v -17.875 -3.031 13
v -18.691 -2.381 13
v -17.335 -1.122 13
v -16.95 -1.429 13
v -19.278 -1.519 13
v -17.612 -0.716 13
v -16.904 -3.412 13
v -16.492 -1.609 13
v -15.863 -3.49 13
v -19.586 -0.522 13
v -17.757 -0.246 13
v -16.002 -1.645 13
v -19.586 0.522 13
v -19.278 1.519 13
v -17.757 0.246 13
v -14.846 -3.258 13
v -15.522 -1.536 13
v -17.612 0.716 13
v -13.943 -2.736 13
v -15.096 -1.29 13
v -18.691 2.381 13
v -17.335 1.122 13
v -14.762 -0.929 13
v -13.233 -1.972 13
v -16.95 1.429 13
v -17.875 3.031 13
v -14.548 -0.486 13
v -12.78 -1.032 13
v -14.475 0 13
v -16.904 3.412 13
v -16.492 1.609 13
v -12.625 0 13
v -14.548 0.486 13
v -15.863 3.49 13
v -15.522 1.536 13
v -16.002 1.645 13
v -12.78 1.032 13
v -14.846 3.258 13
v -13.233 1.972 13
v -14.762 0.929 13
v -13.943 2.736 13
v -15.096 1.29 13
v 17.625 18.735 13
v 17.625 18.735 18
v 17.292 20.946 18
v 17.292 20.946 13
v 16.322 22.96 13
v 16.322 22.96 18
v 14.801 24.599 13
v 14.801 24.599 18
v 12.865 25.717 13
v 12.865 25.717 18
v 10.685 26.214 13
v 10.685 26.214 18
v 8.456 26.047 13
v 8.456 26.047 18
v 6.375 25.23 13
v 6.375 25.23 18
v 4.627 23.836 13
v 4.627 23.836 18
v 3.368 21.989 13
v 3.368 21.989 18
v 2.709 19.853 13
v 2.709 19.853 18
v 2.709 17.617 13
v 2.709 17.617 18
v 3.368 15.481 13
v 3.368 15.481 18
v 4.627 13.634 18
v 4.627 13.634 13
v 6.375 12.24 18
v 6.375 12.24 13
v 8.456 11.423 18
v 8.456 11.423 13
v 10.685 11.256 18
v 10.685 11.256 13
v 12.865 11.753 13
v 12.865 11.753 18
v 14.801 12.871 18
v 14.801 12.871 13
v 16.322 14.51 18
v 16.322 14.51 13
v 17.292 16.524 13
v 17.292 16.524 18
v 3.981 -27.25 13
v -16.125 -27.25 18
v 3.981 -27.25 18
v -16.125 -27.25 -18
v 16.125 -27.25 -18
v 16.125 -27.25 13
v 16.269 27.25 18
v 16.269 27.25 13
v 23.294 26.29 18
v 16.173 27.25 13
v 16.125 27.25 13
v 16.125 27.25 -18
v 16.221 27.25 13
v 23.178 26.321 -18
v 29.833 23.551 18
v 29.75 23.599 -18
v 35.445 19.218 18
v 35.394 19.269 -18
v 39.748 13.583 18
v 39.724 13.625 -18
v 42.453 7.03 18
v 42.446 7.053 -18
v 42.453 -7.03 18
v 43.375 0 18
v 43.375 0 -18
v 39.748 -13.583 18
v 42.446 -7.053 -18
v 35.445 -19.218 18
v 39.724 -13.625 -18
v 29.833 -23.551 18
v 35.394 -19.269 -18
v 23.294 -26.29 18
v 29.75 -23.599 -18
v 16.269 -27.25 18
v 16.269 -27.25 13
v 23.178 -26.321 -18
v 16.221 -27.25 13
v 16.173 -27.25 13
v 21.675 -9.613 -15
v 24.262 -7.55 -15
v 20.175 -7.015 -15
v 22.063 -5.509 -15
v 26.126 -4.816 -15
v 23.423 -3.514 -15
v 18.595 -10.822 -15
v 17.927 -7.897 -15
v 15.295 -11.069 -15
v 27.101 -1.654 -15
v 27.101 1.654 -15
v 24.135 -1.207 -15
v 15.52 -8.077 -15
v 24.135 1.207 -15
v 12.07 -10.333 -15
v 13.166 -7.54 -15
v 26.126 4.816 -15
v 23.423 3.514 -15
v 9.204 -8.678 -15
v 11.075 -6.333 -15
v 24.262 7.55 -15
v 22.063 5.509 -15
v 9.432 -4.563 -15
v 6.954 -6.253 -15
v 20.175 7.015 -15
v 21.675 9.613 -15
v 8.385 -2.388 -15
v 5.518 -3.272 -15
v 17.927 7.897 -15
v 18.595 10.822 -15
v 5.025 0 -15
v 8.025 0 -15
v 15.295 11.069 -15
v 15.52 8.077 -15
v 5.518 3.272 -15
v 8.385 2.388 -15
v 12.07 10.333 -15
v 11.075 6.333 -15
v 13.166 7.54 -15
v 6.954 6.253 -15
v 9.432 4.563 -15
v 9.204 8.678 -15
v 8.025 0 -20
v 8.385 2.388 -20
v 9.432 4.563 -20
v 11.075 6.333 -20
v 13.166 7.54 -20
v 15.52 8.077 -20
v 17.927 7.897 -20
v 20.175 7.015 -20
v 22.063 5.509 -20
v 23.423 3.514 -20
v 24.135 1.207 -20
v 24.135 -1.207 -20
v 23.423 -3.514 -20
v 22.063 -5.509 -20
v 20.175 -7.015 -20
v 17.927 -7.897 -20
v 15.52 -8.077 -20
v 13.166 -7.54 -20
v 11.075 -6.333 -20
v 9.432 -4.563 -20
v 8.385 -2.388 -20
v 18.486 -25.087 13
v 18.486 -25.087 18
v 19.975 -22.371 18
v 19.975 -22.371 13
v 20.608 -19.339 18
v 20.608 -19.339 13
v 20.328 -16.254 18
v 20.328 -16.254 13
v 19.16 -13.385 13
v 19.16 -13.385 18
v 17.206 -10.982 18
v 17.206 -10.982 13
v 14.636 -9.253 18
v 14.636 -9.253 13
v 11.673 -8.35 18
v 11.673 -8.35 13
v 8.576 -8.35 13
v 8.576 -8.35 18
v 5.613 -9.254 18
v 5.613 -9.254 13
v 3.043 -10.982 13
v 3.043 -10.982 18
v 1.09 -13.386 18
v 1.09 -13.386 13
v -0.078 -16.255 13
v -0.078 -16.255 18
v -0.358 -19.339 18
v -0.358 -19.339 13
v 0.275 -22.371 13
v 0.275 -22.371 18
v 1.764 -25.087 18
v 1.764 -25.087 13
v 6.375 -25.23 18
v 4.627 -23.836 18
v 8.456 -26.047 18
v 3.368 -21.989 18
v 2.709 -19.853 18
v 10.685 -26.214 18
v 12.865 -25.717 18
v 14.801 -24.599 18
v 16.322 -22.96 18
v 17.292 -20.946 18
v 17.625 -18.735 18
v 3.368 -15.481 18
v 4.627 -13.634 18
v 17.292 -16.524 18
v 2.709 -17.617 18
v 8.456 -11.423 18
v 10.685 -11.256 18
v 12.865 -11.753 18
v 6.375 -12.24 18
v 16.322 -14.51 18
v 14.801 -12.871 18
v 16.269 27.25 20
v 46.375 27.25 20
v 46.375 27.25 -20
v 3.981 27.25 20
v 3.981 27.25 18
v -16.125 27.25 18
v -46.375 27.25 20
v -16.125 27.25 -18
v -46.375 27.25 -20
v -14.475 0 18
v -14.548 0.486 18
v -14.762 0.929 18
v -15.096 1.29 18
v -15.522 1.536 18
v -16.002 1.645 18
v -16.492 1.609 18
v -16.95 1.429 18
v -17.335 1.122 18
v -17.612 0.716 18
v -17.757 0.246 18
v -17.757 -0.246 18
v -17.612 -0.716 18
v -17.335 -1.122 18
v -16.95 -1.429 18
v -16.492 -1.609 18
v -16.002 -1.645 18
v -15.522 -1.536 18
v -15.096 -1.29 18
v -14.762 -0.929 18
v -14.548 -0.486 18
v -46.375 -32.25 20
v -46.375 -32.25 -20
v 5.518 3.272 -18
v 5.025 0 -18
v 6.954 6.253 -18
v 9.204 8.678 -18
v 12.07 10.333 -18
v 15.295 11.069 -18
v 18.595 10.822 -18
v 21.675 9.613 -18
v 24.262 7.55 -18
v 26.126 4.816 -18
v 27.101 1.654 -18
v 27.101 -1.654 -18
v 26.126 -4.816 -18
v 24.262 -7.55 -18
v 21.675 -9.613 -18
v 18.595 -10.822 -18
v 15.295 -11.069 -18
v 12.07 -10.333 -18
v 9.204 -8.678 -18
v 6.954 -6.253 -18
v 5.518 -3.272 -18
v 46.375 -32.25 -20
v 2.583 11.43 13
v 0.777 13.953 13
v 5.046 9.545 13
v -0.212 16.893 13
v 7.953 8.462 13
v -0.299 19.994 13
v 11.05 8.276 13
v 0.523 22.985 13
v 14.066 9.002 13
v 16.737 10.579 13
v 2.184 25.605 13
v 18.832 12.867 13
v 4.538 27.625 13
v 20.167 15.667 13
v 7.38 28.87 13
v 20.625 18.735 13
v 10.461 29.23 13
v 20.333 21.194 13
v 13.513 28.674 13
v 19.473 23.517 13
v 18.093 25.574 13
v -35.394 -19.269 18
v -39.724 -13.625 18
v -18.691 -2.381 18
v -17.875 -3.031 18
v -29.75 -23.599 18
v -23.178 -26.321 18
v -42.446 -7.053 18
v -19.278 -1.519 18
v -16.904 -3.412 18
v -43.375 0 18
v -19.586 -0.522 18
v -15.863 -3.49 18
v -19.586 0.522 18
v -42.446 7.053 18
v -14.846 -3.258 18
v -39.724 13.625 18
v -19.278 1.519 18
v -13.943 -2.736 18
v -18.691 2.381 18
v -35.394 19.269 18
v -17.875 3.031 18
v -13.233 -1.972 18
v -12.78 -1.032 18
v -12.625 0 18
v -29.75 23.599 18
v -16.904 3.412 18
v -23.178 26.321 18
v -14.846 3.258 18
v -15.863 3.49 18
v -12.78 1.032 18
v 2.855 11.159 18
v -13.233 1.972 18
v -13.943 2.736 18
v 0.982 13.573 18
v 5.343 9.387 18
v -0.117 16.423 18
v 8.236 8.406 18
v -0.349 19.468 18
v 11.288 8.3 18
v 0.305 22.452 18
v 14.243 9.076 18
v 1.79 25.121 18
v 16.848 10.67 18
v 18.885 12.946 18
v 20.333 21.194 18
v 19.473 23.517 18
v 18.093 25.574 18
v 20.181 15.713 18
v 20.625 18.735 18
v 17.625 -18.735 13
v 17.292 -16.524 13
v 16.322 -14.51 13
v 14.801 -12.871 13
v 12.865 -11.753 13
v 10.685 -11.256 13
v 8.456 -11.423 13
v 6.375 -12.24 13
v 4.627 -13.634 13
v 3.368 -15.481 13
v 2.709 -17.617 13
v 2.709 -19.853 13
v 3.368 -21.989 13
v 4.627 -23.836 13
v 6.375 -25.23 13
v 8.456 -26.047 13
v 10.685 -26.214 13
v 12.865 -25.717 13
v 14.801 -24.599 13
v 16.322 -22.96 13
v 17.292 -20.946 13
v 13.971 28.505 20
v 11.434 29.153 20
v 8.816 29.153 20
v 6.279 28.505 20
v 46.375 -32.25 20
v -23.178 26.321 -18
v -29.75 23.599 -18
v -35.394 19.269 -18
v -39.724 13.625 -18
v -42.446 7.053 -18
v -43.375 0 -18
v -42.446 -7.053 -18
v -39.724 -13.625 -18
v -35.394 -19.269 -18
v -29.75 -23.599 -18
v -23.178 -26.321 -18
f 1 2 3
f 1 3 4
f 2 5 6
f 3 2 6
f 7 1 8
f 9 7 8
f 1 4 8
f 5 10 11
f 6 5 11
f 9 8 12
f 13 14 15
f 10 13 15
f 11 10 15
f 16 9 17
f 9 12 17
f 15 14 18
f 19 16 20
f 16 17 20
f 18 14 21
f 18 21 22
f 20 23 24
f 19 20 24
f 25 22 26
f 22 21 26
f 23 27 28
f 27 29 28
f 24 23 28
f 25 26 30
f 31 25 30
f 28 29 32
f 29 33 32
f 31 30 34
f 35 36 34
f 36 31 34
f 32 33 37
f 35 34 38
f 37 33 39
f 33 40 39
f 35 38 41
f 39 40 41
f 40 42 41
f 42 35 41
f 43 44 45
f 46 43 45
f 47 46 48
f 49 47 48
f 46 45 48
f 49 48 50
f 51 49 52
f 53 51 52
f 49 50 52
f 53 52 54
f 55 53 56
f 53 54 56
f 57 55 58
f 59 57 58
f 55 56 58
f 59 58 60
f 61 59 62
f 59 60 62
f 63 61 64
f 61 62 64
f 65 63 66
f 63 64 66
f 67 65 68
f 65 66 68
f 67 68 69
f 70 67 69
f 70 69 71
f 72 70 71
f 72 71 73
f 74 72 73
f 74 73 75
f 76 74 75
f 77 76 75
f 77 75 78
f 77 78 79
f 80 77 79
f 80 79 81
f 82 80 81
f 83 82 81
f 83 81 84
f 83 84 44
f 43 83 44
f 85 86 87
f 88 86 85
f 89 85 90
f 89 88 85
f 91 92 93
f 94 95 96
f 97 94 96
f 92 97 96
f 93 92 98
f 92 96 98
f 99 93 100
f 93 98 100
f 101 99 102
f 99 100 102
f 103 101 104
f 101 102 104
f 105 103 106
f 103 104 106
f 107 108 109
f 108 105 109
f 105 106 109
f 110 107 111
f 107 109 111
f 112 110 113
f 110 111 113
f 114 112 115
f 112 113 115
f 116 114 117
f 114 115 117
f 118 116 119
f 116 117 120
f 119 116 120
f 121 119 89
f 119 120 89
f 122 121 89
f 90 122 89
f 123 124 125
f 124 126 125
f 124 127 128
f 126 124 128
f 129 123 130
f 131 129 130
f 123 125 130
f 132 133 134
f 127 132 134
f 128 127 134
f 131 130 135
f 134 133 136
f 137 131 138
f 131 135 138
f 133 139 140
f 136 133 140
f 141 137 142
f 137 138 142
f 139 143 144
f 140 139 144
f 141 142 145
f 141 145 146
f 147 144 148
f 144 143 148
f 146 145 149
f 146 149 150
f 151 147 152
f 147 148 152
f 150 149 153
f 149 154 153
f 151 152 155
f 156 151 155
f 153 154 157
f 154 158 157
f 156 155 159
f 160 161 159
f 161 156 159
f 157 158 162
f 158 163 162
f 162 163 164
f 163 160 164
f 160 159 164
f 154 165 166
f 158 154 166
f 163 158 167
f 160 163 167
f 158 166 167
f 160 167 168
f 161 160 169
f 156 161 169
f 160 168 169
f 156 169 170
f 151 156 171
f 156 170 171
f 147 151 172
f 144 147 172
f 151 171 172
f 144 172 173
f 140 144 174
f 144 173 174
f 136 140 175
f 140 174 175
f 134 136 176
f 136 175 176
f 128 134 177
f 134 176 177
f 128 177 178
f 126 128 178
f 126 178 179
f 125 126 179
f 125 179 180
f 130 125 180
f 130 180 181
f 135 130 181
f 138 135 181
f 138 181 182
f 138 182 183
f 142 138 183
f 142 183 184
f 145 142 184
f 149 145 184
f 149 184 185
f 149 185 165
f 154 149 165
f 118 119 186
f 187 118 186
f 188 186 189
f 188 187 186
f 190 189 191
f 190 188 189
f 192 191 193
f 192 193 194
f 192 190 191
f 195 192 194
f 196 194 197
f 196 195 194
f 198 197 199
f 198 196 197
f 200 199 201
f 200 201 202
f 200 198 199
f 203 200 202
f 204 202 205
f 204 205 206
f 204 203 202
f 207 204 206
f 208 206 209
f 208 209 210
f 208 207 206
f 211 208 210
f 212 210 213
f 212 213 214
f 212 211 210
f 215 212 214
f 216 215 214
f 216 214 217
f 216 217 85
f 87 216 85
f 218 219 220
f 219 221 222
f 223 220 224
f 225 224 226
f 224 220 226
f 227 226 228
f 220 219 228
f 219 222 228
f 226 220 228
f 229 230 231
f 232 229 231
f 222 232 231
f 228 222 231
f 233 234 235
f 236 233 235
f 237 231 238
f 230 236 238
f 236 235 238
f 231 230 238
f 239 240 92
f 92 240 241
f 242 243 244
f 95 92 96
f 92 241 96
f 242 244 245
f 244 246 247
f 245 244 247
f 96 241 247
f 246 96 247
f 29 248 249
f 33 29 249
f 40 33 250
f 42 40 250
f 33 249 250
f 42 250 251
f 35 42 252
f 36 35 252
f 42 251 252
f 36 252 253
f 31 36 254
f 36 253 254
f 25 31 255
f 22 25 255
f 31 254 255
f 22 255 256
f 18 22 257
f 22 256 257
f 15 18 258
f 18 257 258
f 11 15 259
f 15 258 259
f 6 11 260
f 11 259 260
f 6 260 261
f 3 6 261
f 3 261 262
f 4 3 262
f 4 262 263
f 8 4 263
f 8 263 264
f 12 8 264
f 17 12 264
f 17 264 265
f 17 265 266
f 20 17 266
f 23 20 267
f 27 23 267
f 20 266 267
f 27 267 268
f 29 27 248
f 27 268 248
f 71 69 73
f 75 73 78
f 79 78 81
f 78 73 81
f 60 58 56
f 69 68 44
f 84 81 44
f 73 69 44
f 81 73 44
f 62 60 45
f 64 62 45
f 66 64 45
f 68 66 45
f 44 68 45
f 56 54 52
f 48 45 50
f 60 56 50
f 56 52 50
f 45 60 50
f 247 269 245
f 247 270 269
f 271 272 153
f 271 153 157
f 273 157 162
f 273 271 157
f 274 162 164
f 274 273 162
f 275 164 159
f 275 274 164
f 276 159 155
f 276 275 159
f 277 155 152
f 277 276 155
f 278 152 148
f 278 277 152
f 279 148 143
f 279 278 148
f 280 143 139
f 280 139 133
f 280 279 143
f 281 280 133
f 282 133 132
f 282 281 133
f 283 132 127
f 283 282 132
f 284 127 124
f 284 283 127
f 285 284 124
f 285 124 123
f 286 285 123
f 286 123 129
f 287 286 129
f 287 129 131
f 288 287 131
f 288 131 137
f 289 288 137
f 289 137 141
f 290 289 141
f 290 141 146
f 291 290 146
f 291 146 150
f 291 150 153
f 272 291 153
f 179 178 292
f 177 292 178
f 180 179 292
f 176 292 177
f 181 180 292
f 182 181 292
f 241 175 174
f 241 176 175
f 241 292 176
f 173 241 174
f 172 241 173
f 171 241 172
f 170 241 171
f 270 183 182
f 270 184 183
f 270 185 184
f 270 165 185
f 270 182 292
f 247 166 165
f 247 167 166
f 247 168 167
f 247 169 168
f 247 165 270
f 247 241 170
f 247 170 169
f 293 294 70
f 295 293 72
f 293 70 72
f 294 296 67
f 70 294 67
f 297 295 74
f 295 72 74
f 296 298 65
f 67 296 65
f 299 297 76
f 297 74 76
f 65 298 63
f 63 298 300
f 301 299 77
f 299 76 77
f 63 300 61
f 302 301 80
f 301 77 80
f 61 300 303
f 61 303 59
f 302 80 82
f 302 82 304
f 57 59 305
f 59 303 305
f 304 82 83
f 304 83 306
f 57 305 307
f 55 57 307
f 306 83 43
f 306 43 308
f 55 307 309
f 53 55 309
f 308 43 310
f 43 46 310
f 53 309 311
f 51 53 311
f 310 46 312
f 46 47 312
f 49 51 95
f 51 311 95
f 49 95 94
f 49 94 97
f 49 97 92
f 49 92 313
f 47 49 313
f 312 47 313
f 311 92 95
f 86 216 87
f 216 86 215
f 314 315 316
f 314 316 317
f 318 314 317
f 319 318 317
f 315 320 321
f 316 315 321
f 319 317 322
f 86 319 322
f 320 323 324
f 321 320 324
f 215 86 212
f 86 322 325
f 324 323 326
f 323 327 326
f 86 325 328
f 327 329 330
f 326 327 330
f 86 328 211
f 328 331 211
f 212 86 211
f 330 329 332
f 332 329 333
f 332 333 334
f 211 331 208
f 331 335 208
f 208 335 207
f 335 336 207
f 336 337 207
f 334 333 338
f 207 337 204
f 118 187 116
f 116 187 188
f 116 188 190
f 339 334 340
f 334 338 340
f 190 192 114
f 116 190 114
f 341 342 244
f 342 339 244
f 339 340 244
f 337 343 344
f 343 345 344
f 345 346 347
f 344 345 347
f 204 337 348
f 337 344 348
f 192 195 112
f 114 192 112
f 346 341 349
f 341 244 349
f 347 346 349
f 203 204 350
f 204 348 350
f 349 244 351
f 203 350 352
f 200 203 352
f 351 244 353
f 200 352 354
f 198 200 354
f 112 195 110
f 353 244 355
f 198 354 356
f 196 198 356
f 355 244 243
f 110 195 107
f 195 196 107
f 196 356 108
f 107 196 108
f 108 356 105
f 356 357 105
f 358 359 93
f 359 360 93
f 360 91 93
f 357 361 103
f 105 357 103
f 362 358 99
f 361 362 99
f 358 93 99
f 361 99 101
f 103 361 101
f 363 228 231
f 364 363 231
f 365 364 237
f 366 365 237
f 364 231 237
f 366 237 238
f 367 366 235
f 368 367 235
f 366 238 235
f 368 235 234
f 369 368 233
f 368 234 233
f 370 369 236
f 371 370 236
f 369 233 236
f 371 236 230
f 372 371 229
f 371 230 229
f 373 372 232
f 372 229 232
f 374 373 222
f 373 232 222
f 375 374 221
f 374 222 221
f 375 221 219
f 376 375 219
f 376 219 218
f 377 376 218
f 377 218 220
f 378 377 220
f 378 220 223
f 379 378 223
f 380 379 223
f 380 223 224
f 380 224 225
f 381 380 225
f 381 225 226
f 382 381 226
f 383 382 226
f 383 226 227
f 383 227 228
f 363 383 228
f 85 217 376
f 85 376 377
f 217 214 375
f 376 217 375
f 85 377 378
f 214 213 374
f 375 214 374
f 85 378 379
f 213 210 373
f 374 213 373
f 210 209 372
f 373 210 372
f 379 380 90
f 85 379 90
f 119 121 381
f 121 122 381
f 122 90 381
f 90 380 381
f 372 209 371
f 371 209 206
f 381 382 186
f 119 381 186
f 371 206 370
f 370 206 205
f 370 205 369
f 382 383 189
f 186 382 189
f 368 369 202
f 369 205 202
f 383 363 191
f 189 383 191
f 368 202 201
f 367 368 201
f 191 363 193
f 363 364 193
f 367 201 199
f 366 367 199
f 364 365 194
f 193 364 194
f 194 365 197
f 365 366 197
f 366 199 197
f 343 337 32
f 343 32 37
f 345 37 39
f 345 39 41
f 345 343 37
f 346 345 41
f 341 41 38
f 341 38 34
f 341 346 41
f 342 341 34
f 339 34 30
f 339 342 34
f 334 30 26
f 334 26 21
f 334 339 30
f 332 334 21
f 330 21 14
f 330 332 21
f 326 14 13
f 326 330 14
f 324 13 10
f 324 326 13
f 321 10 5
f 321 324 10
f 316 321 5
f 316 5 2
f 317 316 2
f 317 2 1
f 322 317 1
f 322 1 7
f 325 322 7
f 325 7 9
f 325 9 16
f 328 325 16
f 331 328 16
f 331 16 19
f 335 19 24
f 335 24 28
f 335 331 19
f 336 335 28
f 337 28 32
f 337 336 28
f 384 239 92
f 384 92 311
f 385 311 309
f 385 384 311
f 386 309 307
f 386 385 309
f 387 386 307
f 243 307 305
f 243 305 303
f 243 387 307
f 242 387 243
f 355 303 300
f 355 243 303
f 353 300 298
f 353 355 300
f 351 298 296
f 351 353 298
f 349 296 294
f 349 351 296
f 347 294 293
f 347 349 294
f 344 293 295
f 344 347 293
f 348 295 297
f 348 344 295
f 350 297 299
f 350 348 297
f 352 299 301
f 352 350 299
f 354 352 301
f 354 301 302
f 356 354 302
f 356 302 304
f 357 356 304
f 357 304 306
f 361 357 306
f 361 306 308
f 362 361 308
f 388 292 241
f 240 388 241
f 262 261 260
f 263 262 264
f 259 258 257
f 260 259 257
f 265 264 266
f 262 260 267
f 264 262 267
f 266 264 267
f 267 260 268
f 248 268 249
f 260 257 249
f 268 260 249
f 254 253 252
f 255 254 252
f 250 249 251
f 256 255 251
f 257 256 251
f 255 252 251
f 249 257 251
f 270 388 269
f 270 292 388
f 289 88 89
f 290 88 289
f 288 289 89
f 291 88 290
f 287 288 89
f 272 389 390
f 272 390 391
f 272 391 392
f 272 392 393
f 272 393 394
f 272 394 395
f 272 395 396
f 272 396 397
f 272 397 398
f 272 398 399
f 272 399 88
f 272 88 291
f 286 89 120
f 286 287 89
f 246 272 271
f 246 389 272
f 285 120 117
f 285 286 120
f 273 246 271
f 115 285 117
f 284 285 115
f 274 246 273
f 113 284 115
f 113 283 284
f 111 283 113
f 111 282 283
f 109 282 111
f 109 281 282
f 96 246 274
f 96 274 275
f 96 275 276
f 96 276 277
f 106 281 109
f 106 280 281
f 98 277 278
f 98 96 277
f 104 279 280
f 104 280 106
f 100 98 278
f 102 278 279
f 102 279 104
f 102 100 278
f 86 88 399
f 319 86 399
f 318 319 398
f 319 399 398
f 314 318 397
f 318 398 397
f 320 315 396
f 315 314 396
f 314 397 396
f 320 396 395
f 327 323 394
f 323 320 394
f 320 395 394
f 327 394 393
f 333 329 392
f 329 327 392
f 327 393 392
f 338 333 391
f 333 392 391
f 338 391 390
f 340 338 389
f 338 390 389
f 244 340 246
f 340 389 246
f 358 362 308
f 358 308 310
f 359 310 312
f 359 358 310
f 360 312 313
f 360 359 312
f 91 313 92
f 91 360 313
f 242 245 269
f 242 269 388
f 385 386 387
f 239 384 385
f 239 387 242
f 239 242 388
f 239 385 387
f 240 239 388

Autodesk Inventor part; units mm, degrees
ref_plane "YZ Plane" through (0, 0, 0) normal (1, 0, 0) x (0, 1, 0)
ref_plane "XZ Plane" through (0, 0, 0) normal (0, 1, 0) x (-1, 0, 0)
ref_plane "XY Plane" through (0, 0, 0) normal (0, 0, 1) x (1, 0, 0)
sketch "Sketch1" plane through (0, 0, 0) normal (0, 0, 1) x (1, 0, 0)
  circle A0 centre (-16.125, 0) radius 6
  arc A1 (16.125, -18.735) -> (5.2413, -15.2494) centre (10.125, -18.735) ccw
  arc A2 (16.125, 18.735) -> (5.2413, 15.2494) centre (10.125, 18.735) ccw
  circle A3 centre (10.125, 18.735) radius 7.5
  circle A4 centre (10.125, -18.735) radius 7.5
  line L0 (16.125, 27.25) -> (-16.125, 27.25)
  arc A5 (-16.125, 27.25) -> (-16.125, -27.25) centre (-16.125, 0) ccw
  line L1 (-16.125, -27.25) -> (16.125, -27.25)
  arc A6 (16.125, -27.25) -> (16.125, 27.25) centre (16.125, 0) ccw
  arc A7 (-29.2589, 27.25) -> (-16.125, -30.25) centre (-16.125, 0) ccw
  line L2 (-16.125, -30.25) -> (16.125, -30.25)
  arc A8 (16.125, -30.25) -> (29.2589, 27.25) centre (16.125, 0) ccw
  line L3 (-16.125, -30.25) -> (16.125, -30.25)
  line L4 (46.375, -30.25) -> (46.375, 27.25)
  line L5 (-46.375, 27.25) -> (-46.375, -30.25)
  line L6 (-46.375, -30.25) -> (46.375, 30.25) construction
  line L7 (46.375, -30.25) -> (-46.375, 30.25) construction
  line L8 (46.375, 27.25) -> (-46.375, 27.25)
  line L9 (-16.125, -30.25) -> (16.125, -30.25)
  line L10 (46.375, -30.25) -> (46.375, -32.25)
  line L11 (46.375, -32.25) -> (-46.375, -32.25)
  line L12 (-46.375, -32.25) -> (-46.375, -30.25)
  line L13 (-46.375, 27.25) -> (46.375, 27.25)
  line L14 (46.375, 27.25) -> (46.375, -32.25)
  line L15 (46.375, -32.25) -> (-46.375, -32.25)
  line L16 (-46.375, -32.25) -> (-46.375, 27.25)
  point P0 (0, 0)
  point P1 (0, 26.25)
  point P2 (0, -26.25)
  dimension "d1" = 12
  dimension "d3" = 12
  dimension "d4" = 12
  dimension "d6" = 15
  dimension "d7" = 15
  dimension "d9" = 3
  dimension "d12" = 2
extrude "Extrusion2" add sketch "Sketch1" along normal mid plane 40 contours A0 | A3 | A4 | A6 L1 A5 L0 | L8 A8 L2 A7 A5 L1 A6 | L8 L4 A8 | A7 L5 L8 | L4 L10 L11 L12 L5 A7 L2 A8
extrude "Extrusion3" cut sketch "Sketch1" along normal mid plane 36 contours A6 L1 A5 L0
extrude "Extrusion4" cut sketch "Sketch1" along normal mid plane 36 contours A0 | A3 | A4
sketch "Sketch2" plane through (0, 0, 20) normal (0, 0, 1) x (1, 0, 0)
  arc A0 (16.125, -18.735) -> (5.2413, -15.2494) centre (10.125, -18.735) ccw projected
  circle A1 centre (10.125, 18.735) radius 7.5 projected
  circle A2 centre (-16.125, 0) radius 6 projected
  circle A3 centre (10.125, 18.735) radius 7.5
  circle A4 centre (10.125, 18.735) radius 10.5
  circle A5 centre (10.125, -18.735) radius 7.5
  circle A6 centre (10.125, -18.735) radius 10.5
  circle A7 centre (-16.125, 0) radius 1.65
  circle A8 centre (-16.125, 0) radius 3.5
  point P0 (0, 0)
  point P1 (16.125, 0)
  dimension "d19" = 21
  dimension "d20" = 15
  dimension "d21" = 21
  dimension "d22" = 3.3
  dimension "d23" = 7
extrude "Extrusion5" add sketch "Sketch2" against normal blind 7 contours A4 | A6 | A8
sketch "Sketch3" plane through (0, 0, -20) normal (0, 0, -1) x (-1, 0, 0)
  circle A0 centre (-16.125, 0) radius 8.1
  circle A1 centre (-16.125, 0) radius 11.1
  point P0 (0, 0)
  dimension "d26" = 16.2
  dimension "d27" = 3
extrude "Extrusion6" add sketch "Sketch3" against normal blind 5
extrude "Extrusion7" cut sketch "Sketch3" against normal blind 5 contours A0
properties part number "referencia"
